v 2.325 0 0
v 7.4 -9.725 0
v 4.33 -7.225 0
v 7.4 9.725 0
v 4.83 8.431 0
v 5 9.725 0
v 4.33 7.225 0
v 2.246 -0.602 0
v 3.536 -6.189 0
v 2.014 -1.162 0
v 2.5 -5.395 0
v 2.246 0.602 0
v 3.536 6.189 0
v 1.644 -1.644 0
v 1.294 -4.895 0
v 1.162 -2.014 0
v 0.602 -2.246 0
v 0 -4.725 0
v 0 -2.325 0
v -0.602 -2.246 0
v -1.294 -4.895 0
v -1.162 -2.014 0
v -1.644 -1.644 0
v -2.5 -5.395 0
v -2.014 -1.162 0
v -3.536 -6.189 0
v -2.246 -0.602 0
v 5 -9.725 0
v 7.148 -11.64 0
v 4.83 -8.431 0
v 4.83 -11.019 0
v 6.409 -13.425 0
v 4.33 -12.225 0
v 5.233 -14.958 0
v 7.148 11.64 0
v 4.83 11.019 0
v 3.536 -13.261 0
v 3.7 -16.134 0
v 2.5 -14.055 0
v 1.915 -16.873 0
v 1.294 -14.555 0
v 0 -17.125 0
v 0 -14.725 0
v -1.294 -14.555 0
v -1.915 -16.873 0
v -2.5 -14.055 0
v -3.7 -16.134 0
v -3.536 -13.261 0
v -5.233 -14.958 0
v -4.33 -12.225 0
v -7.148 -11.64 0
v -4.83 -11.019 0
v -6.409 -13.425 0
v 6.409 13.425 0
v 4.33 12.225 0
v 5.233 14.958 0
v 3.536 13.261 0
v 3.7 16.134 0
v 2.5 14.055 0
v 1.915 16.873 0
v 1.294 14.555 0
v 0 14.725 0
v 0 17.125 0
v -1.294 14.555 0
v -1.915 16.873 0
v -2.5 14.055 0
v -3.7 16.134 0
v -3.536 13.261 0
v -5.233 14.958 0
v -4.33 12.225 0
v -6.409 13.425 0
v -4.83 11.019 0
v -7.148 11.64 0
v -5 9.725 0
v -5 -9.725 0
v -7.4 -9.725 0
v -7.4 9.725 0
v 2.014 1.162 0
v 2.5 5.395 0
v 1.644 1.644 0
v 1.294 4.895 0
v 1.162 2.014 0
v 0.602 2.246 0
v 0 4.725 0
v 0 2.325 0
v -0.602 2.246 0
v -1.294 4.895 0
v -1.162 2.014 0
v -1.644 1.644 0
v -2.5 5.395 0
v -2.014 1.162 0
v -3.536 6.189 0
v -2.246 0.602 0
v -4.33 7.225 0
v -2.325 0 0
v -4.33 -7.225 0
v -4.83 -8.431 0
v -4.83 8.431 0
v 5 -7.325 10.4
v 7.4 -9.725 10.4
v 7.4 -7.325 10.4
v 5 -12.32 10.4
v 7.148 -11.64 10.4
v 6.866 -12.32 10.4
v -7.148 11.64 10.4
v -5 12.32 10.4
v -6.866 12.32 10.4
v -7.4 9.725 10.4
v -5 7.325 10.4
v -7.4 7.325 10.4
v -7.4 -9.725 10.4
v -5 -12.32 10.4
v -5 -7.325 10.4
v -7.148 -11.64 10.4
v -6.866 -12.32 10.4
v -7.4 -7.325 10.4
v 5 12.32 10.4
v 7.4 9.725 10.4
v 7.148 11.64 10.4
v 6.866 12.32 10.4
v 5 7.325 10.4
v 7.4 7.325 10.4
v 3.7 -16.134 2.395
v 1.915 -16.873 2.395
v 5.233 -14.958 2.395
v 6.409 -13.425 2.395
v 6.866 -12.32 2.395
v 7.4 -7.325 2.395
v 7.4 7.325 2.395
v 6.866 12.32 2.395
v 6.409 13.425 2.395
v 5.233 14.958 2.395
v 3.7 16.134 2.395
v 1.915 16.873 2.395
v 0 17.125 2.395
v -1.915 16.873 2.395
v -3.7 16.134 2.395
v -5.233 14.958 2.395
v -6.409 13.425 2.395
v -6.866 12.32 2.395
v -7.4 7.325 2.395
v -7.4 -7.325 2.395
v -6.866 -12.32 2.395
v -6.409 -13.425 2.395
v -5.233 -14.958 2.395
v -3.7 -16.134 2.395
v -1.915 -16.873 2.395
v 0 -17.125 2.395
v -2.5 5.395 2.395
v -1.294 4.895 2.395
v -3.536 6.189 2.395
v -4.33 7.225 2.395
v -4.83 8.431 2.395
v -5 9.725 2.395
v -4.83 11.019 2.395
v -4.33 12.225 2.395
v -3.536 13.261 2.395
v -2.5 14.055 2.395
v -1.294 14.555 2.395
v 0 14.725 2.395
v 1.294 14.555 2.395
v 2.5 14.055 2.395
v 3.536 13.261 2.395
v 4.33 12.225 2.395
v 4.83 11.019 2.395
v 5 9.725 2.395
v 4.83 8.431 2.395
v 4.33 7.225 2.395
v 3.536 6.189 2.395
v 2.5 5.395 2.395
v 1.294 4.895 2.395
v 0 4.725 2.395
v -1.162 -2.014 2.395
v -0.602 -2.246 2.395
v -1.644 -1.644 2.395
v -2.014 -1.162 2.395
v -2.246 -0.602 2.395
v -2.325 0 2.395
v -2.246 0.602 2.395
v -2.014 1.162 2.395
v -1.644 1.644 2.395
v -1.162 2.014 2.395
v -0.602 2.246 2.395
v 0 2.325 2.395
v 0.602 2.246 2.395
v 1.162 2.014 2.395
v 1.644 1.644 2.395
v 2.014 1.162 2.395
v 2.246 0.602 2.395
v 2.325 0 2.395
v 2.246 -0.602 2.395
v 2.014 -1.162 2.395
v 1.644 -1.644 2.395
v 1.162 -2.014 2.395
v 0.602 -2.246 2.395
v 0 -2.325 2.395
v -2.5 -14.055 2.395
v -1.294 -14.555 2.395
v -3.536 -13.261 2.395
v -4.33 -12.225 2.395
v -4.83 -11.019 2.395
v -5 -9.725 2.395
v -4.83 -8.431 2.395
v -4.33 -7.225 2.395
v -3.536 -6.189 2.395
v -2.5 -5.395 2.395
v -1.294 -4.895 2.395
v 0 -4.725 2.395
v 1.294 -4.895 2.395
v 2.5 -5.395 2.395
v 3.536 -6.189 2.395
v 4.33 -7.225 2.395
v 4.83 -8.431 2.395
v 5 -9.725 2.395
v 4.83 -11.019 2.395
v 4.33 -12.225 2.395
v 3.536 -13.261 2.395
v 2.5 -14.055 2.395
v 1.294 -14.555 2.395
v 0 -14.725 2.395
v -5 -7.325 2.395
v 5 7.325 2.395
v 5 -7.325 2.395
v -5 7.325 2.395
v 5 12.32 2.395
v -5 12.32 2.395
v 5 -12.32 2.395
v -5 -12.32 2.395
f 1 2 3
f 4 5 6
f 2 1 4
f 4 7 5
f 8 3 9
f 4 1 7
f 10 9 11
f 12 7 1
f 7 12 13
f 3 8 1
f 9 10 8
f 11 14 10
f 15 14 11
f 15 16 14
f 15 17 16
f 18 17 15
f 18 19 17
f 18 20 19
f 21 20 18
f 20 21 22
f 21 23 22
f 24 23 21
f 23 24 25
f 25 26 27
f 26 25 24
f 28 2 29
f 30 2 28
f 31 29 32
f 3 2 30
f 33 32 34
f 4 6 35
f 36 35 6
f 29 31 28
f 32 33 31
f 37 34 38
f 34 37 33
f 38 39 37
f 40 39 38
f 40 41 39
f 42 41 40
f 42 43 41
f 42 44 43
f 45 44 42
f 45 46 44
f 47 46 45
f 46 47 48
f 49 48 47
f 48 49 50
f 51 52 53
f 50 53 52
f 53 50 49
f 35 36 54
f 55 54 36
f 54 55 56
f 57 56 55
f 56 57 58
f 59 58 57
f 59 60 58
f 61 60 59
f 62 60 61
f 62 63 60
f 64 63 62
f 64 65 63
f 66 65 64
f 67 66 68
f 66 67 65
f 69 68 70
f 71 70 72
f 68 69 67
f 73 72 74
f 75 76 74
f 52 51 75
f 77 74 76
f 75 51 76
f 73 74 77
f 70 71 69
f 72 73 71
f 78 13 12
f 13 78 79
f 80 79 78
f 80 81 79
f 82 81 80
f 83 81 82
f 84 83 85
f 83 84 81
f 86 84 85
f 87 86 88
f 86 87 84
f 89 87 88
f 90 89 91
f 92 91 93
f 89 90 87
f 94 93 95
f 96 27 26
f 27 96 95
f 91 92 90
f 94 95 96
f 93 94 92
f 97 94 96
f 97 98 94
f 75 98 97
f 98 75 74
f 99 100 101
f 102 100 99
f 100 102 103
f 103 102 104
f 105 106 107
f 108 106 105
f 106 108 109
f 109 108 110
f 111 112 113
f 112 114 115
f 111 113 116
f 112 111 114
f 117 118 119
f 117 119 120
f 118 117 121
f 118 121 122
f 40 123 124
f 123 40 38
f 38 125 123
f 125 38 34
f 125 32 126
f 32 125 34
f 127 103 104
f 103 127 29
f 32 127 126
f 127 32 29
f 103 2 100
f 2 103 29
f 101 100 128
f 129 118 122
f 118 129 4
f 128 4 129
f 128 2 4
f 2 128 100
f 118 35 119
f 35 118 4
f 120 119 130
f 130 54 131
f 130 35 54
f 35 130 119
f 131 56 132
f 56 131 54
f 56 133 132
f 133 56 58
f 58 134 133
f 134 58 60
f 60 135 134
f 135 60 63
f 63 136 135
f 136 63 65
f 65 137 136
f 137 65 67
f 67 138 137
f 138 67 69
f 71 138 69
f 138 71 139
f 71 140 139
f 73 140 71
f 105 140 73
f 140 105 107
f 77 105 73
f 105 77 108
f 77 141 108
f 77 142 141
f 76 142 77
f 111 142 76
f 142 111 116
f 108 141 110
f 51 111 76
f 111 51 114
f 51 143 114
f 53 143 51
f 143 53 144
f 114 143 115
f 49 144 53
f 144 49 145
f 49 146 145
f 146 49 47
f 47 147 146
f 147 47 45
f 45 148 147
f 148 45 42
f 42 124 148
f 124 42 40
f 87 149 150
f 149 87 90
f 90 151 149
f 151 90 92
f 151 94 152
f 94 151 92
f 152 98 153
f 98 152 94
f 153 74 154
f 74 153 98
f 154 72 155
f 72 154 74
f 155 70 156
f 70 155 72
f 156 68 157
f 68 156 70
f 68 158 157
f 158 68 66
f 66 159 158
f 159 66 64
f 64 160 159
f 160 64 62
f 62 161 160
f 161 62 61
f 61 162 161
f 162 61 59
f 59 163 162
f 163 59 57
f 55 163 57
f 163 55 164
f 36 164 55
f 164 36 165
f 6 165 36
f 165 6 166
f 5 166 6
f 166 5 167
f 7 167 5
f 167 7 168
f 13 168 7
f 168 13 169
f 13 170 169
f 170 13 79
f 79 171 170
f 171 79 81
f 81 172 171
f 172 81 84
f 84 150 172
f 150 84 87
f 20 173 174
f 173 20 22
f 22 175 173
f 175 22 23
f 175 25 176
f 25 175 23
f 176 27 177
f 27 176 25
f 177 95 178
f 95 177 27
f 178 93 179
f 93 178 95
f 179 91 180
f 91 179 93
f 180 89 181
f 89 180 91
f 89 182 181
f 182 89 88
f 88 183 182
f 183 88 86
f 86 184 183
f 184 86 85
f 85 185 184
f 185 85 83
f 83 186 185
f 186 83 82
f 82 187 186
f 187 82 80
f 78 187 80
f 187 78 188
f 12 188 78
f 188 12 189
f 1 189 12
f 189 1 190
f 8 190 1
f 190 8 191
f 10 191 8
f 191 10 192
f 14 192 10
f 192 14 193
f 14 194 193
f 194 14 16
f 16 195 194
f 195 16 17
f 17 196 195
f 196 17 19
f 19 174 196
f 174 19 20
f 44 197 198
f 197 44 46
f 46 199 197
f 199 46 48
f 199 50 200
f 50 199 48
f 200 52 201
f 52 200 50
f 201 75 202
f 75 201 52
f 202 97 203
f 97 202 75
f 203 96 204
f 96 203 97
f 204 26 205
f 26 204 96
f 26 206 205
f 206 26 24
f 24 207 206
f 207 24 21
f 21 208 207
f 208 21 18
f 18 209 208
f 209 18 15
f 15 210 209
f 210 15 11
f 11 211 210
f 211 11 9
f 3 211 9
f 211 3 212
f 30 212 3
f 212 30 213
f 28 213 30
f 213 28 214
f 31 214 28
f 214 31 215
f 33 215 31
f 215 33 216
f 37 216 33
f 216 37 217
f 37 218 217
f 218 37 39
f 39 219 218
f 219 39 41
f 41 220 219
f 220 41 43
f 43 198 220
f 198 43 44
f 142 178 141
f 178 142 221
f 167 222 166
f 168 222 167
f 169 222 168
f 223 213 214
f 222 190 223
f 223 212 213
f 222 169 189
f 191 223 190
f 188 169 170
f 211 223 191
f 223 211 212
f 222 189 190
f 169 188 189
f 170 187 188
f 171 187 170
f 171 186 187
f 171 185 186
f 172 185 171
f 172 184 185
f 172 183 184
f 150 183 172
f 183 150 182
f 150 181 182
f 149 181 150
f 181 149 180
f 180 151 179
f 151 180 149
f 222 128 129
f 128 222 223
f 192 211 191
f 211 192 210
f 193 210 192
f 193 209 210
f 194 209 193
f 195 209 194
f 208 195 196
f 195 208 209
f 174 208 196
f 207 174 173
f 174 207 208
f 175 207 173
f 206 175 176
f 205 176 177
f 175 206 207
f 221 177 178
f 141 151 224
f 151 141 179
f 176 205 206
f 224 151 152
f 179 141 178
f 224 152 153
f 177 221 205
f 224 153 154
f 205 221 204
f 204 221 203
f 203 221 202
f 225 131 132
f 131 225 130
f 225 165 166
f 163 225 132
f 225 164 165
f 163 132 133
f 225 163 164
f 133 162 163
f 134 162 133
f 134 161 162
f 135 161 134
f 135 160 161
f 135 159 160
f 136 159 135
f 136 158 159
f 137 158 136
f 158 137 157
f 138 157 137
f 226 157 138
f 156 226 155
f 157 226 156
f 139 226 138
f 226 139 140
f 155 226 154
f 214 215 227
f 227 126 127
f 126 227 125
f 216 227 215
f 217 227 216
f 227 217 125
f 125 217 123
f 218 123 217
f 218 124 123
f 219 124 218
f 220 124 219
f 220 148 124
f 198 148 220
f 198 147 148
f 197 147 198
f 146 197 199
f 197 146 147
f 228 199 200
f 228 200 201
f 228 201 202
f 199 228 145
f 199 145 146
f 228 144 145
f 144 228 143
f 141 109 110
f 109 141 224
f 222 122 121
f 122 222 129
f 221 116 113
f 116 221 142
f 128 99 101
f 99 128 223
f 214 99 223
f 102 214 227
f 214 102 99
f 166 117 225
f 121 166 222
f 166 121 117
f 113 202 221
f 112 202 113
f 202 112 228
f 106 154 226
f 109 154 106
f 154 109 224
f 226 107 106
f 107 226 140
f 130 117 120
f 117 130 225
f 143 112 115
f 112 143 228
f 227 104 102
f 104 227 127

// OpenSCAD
thickness = 2.4; // mm
height = 8;
outer_hole_diameter = 10; //mm
inner_hole_diameter = 4.65; //mm
length = outer_hole_diameter + 2 * thickness + inner_hole_diameter;
$fn=24;

difference() {
  linear_extrude(thickness + height) {
    difference() {
      hull() {
        translate([0, length / 2]) {
          circle(d = outer_hole_diameter + 2 * thickness);
        }
        translate([0, length / -2]) {
          circle(d = outer_hole_diameter + 2 * thickness);
        }
      }

      translate([0, length / 2]) {
        circle(d = outer_hole_diameter);
      }
      translate([0, length / -2]) {
        circle(d = outer_hole_diameter);
      }
      circle(d = inner_hole_diameter);
    }
  }
  translate([0, 0, height / 2 + thickness]) {
    cube([outer_hole_diameter + 2 * thickness + 0.01,
          inner_hole_diameter + outer_hole_diameter,
          height + 0.01],
         true);
  }
  translate([0, 0, height / 2 + thickness]) {
    cube([outer_hole_diameter,
      inner_hole_diameter + 2 * outer_hole_diameter + 4 * thickness,
        height + 0.01],
       true);
  }
  translate([0,
             inner_hole_diameter / 2 + thickness + outer_hole_diameter,
             height / 2 + thickness]) {
    cube([outer_hole_diameter + 2 * thickness + 0.01,
          2 * thickness + 0.01,
          height + 0.01],
         true);
  }

  translate([0,
             -1 * (inner_hole_diameter / 2 + thickness + outer_hole_diameter),
             height / 2 + thickness]) {
    cube([outer_hole_diameter + 2 * thickness + 0.01,
          2 * thickness + 0.01,
          height + 0.01],
         true);
  }
}
